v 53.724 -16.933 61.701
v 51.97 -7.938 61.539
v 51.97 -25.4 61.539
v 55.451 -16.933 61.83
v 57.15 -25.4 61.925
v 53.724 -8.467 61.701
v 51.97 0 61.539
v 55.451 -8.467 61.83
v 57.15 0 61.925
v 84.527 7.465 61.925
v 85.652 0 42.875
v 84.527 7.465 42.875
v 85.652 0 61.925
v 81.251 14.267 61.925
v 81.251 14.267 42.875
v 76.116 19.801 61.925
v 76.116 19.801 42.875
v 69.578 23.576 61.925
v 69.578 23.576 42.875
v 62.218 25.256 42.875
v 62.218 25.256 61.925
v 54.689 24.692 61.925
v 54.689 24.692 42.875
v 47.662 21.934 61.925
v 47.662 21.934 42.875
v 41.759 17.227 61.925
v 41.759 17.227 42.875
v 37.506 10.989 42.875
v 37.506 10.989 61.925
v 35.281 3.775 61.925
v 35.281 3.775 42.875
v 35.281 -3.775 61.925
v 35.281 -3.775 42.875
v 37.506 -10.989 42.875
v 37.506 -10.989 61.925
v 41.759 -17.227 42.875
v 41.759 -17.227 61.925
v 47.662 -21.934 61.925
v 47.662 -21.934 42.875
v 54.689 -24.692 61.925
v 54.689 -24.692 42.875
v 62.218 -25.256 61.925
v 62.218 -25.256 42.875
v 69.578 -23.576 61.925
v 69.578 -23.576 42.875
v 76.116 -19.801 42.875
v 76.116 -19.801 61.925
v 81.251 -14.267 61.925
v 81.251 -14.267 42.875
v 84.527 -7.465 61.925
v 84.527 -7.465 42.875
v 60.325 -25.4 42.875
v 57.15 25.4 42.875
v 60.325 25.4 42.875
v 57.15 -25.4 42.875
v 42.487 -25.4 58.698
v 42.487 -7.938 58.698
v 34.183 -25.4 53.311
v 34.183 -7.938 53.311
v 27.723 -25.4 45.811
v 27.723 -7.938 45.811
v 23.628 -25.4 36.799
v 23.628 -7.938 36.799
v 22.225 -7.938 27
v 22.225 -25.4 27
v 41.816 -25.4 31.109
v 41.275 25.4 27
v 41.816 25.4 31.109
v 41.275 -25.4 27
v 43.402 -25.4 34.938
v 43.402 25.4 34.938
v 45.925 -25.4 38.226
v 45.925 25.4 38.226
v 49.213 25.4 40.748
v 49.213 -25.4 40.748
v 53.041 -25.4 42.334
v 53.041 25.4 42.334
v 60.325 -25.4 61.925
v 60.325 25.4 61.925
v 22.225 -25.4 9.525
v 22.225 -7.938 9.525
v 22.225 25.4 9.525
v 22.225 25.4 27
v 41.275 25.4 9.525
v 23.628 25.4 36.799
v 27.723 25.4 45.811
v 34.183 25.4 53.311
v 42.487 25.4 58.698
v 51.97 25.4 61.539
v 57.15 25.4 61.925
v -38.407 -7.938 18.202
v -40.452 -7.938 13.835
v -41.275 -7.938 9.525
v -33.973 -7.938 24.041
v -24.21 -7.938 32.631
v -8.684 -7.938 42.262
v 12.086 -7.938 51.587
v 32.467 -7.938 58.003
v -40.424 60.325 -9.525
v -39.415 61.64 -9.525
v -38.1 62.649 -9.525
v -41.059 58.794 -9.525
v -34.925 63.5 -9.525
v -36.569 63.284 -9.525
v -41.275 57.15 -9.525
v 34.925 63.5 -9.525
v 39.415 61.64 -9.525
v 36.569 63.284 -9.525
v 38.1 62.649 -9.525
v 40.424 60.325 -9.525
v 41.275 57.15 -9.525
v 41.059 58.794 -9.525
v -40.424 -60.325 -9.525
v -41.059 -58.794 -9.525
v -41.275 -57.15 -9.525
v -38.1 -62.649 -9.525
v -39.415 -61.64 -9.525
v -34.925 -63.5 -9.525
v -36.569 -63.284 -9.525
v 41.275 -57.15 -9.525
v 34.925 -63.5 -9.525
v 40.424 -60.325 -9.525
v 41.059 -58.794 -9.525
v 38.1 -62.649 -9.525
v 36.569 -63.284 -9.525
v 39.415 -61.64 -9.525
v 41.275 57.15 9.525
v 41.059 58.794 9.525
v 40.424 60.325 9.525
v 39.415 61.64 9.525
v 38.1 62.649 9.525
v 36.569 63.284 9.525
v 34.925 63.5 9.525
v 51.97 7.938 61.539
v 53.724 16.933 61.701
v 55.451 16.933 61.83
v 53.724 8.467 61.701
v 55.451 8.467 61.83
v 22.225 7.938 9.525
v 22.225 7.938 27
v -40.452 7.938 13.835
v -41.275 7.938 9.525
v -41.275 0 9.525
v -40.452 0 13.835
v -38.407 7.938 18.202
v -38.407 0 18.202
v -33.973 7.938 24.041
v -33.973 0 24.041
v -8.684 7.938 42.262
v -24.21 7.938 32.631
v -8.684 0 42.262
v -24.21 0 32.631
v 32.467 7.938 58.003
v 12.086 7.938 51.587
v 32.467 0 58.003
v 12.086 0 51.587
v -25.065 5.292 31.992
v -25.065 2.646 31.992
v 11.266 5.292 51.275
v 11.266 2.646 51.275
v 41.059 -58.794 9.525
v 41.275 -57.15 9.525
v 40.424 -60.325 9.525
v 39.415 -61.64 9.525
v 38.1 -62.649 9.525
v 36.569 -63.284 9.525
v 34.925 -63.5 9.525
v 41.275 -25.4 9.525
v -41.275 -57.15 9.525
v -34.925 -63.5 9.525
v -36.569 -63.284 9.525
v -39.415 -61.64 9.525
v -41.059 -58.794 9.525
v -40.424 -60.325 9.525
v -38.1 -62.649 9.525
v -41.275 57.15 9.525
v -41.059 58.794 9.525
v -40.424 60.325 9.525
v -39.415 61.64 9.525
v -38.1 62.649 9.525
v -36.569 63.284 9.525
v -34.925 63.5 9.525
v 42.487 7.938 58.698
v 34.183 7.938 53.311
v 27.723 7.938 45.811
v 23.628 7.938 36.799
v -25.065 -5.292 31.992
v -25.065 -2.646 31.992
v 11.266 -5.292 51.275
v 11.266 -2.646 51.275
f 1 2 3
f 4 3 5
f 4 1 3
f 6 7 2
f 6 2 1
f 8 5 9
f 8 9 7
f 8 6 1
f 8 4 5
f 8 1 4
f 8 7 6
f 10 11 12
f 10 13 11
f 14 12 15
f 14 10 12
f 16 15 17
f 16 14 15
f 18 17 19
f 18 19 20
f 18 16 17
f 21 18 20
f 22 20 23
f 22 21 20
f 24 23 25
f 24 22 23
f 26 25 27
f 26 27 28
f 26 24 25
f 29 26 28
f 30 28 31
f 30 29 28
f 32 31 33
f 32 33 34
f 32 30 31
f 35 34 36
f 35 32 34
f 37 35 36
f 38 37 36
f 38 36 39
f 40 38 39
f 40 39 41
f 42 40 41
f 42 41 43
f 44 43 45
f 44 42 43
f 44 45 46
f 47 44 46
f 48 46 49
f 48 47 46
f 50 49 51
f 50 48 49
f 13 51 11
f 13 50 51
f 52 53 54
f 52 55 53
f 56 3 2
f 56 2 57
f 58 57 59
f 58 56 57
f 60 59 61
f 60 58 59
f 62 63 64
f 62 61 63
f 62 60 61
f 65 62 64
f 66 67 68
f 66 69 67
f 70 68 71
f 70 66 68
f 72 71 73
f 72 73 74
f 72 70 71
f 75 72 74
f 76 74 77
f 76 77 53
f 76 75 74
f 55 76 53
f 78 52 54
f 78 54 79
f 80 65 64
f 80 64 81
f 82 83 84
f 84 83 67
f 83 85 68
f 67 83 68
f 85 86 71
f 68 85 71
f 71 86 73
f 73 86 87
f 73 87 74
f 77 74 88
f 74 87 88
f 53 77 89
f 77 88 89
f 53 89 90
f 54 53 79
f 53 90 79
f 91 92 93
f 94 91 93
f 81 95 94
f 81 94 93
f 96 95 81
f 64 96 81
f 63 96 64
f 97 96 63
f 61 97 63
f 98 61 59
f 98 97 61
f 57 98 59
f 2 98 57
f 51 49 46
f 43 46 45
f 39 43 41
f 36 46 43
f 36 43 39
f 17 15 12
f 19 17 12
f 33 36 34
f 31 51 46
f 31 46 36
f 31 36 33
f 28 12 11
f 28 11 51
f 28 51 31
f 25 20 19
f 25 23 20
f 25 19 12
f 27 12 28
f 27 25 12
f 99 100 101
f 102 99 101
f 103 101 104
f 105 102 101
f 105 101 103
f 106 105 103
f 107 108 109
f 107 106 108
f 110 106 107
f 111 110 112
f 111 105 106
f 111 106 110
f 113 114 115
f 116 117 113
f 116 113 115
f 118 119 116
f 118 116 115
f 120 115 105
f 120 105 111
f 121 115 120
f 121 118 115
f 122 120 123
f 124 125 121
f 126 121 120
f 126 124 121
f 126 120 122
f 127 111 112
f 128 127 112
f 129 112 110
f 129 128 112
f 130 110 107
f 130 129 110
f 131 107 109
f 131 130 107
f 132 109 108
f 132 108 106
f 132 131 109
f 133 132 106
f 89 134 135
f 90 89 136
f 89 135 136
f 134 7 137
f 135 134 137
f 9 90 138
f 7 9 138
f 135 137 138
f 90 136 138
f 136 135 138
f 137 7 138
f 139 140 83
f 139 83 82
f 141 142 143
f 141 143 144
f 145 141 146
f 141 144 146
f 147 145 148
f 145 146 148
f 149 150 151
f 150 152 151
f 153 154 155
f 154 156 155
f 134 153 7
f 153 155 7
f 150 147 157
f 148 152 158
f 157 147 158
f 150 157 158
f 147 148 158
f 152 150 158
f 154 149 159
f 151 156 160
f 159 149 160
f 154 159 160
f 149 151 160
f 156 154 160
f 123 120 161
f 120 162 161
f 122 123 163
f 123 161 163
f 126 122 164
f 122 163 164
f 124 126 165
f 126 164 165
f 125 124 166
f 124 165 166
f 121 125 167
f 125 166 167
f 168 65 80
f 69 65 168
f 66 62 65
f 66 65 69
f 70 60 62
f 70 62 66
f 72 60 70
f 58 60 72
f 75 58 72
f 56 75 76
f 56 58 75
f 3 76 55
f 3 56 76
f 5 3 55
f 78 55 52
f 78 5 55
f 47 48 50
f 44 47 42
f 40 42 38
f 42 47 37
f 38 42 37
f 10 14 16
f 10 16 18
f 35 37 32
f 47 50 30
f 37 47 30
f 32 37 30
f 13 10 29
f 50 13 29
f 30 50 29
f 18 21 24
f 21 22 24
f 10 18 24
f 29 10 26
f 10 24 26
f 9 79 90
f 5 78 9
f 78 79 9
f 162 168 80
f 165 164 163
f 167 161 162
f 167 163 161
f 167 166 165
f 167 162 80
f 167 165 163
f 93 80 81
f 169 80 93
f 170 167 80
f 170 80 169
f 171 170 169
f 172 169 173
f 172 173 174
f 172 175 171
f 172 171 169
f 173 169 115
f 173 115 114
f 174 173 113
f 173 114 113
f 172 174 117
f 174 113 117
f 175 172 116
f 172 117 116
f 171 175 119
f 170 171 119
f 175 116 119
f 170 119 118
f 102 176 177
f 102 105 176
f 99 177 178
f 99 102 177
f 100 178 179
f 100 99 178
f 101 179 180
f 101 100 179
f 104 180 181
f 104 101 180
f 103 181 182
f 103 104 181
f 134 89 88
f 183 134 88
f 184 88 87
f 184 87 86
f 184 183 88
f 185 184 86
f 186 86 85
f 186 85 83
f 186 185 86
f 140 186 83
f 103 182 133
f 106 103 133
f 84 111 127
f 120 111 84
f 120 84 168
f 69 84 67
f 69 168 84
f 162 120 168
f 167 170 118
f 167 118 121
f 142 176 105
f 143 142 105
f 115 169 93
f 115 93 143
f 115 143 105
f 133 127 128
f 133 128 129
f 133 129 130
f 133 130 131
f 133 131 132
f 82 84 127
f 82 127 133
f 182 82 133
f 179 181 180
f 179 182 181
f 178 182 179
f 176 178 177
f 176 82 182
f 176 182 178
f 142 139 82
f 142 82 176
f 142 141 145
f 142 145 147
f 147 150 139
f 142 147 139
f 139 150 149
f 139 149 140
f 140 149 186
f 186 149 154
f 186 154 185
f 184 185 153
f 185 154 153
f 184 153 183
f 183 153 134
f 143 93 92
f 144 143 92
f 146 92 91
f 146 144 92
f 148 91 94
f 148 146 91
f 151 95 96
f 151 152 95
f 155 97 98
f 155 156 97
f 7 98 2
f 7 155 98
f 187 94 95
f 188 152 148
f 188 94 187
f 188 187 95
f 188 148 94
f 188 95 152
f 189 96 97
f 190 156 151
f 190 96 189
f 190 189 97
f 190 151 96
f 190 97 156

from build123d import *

# Parameters (mm, degrees)
F1_DEPTH = 63.5
F2_DEPTH = 25.4
F3_DEPTH = 7.9375
F0_W     = 25.3267031789
F0_H     = 19.05
F5_R     = 6.35


with BuildPart() as f1:
    # F0 (on Front) → F1 (new body, symmetric)
    with BuildSketch(Plane.XZ):
        Polygon((41.275, -9.525), (41.275, 9.525), (22.225, 9.525), (-41.275, 9.525), (-41.275, -9.525), align=None)
    extrude(amount=F1_DEPTH, both=True)

    # F0 (on Front) → F2 (join, symmetric)
    with BuildSketch(Plane.XZ):
        with BuildLine():
            Line((57.15, 42.8752), (60.325, 42.8752))
            Line((60.325, 42.8752), (60.325, 61.9252))
            Line((60.325, 61.9252), (57.15, 61.9252))
            add(Edge.make_bspline(
                [(51.9697236695, 61.5388792182), (53.7365276643, 61.7176558789), (55.4657297476, 61.8473348481), (57.15, 61.9252)],
                knots=[106.5052109984, 106.5052109984, 106.5052109984, 106.5052109984, 111.5045361635, 111.5045361635, 111.5045361635, 111.5045361635], degree=3))
            ThreePointArc((51.9697236695, 61.5388792182), (30.6860927314, 49.7909269976), (22.225, 27.0002))
            Line((22.225, 27.0002), (22.225, 9.525))
            Line((22.225, 9.525), (41.275, 9.525))
            Line((41.275, 9.525), (41.275, 27.0002))
            ThreePointArc((41.275, 27.0002), (45.9246798487, 38.2255201513), (57.15, 42.8752))
        make_face()
    extrude(amount=F2_DEPTH, both=True)

    # F0 (on Front) → F3 (join, symmetric)
    with BuildSketch(Plane.XZ):
        with BuildLine():
            ThreePointArc((22.225, 27.0002), (30.6860927314, 49.7909269976), (51.9697236695, 61.5388792182))
            add(Edge.make_bspline(
                [(-41.275, 9.525), (-40.3758565512, 31.6382665725), (14.3298770823, 57.7302359834), (51.9697236695, 61.5388792182)],
                knots=[0, 0, 0, 0, 106.5052109984, 106.5052109984, 106.5052109984, 106.5052109984], degree=3))
            Line((-41.275, 9.525), (22.225, 9.525))
            Line((22.225, 9.525), (22.225, 27.0002))
        make_face()
    extrude(amount=F3_DEPTH, both=True)

    # F5
    f5_edges = [f1.edges().sort_by_distance(p)[0] for p in [
        (41.275, 63.5, 0),
        (41.275, -63.5, 0),
        (-41.275, -63.5, 0),
        (-41.275, 63.5, 0),
    ]]
    fillet(f5_edges, radius=F5_R)


with BuildPart() as f4:
    # F0 (on Front) → F4 (revolve)
    with BuildSketch(Plane.XZ):
        with Locations((72.9883515894, 52.4002)):
            Rectangle(F0_W, F0_H)
    revolve(axis=Axis((60.325, 0, 52.3875), (0, 0, 1)))


solid = Compound([f1.part, f4.part])
